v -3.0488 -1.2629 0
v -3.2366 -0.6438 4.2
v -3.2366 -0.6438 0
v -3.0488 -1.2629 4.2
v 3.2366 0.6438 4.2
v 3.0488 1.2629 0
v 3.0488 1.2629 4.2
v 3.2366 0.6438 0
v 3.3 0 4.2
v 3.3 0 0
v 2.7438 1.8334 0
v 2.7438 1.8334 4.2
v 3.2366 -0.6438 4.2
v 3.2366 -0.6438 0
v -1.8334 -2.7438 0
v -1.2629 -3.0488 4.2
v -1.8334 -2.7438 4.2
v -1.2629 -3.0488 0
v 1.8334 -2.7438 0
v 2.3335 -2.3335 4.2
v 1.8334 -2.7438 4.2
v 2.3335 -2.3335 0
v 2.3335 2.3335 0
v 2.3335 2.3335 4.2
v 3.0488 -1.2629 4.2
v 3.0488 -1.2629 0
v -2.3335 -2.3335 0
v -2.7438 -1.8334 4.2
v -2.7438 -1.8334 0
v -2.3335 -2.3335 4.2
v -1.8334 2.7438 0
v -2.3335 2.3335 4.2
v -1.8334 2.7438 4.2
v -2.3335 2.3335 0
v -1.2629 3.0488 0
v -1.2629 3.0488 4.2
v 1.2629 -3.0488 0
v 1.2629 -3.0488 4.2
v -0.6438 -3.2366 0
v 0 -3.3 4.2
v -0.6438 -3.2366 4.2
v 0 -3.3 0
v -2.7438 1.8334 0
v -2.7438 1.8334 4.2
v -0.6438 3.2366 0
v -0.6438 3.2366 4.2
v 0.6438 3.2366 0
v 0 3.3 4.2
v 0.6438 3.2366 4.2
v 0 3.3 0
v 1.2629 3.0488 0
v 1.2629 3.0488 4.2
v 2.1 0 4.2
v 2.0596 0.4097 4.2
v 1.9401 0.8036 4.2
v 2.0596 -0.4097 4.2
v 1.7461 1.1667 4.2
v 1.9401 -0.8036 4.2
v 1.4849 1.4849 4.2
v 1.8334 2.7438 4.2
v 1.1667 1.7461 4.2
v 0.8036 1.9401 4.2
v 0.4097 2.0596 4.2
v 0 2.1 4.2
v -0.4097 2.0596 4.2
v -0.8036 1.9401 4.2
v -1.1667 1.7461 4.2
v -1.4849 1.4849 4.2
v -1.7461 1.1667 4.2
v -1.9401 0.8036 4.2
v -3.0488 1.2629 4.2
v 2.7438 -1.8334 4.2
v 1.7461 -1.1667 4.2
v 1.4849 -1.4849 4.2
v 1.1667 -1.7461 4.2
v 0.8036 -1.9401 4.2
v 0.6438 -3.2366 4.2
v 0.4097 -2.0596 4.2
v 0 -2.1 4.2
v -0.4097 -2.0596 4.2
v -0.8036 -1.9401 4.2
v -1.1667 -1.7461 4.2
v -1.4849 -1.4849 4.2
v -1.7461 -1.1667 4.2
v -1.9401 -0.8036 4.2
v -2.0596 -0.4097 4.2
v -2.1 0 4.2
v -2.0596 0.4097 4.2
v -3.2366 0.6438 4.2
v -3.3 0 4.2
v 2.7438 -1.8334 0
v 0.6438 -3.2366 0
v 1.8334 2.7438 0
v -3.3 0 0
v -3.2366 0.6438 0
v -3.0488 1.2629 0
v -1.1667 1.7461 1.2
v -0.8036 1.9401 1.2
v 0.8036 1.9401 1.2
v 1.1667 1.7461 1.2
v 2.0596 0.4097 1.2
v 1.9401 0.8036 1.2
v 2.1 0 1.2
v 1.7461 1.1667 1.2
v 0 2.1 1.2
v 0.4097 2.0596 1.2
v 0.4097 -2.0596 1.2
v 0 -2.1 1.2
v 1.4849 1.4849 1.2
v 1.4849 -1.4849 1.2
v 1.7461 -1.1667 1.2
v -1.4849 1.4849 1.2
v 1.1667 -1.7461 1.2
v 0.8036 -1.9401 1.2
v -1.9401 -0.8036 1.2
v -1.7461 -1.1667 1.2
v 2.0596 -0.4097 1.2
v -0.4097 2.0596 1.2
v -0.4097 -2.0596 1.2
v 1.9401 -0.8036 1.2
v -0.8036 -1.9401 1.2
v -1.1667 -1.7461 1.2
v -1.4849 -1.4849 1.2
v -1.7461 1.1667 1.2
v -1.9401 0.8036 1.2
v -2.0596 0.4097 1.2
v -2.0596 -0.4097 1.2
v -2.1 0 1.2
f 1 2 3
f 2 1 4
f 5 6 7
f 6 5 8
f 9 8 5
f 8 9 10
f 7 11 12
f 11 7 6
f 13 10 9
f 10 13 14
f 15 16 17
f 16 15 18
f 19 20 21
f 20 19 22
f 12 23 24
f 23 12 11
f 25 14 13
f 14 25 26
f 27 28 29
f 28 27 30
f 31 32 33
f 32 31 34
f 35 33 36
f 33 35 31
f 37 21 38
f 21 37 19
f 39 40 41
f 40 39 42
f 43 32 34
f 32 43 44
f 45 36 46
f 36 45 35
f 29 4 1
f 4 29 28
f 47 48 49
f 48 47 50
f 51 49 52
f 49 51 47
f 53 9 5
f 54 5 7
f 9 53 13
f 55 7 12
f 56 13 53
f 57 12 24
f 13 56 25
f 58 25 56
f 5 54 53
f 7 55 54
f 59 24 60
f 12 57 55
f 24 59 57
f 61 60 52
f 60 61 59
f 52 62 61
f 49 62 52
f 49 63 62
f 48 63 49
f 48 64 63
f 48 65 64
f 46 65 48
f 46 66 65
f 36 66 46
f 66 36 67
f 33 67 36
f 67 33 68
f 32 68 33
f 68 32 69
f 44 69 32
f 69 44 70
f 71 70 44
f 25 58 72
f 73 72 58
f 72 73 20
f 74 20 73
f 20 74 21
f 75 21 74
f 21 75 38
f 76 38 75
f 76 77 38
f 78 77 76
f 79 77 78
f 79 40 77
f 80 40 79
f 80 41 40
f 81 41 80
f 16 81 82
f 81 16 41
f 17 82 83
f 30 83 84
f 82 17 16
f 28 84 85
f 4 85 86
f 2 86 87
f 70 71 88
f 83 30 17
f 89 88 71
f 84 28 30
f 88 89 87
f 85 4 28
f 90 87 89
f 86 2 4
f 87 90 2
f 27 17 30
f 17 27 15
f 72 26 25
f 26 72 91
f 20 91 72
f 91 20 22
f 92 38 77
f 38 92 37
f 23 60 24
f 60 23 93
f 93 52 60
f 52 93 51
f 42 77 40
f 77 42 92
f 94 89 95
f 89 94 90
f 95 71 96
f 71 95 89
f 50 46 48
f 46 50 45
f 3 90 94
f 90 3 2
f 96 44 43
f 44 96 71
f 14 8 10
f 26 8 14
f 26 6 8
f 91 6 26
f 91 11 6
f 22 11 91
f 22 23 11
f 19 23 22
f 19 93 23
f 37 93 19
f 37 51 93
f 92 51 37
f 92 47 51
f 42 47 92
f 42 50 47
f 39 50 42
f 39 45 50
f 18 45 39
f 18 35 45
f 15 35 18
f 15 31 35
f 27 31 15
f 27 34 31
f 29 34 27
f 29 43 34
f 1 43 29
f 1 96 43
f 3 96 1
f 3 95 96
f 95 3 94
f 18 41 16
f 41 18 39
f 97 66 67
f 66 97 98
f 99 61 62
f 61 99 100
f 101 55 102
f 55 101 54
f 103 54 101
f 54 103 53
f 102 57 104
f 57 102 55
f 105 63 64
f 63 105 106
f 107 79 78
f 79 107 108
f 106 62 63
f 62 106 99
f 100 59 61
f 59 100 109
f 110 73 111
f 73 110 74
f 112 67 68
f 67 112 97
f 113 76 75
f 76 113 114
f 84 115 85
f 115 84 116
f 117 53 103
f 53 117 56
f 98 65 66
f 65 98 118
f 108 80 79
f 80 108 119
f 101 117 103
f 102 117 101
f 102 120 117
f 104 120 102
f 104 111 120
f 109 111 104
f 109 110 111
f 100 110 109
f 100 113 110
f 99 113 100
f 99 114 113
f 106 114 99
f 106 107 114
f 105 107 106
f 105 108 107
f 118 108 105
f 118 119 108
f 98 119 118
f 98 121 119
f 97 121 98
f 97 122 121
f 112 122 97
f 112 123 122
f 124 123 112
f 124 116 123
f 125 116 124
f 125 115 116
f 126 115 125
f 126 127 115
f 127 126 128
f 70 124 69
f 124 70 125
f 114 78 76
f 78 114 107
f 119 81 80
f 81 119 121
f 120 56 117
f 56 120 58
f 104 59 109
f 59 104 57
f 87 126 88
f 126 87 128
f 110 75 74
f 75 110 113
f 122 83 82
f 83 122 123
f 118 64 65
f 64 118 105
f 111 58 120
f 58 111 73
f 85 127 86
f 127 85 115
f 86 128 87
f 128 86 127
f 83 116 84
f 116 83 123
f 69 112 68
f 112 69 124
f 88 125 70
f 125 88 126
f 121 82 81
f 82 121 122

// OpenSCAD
$fn=32;
rodR=2;
t=1.2;
h=3;

difference() {
  cylinder(r=rodR+0.1+t,h=h+t);
  translate([0,0,t]) cylinder(r=rodR+0.1,h=h+0.1);
}
